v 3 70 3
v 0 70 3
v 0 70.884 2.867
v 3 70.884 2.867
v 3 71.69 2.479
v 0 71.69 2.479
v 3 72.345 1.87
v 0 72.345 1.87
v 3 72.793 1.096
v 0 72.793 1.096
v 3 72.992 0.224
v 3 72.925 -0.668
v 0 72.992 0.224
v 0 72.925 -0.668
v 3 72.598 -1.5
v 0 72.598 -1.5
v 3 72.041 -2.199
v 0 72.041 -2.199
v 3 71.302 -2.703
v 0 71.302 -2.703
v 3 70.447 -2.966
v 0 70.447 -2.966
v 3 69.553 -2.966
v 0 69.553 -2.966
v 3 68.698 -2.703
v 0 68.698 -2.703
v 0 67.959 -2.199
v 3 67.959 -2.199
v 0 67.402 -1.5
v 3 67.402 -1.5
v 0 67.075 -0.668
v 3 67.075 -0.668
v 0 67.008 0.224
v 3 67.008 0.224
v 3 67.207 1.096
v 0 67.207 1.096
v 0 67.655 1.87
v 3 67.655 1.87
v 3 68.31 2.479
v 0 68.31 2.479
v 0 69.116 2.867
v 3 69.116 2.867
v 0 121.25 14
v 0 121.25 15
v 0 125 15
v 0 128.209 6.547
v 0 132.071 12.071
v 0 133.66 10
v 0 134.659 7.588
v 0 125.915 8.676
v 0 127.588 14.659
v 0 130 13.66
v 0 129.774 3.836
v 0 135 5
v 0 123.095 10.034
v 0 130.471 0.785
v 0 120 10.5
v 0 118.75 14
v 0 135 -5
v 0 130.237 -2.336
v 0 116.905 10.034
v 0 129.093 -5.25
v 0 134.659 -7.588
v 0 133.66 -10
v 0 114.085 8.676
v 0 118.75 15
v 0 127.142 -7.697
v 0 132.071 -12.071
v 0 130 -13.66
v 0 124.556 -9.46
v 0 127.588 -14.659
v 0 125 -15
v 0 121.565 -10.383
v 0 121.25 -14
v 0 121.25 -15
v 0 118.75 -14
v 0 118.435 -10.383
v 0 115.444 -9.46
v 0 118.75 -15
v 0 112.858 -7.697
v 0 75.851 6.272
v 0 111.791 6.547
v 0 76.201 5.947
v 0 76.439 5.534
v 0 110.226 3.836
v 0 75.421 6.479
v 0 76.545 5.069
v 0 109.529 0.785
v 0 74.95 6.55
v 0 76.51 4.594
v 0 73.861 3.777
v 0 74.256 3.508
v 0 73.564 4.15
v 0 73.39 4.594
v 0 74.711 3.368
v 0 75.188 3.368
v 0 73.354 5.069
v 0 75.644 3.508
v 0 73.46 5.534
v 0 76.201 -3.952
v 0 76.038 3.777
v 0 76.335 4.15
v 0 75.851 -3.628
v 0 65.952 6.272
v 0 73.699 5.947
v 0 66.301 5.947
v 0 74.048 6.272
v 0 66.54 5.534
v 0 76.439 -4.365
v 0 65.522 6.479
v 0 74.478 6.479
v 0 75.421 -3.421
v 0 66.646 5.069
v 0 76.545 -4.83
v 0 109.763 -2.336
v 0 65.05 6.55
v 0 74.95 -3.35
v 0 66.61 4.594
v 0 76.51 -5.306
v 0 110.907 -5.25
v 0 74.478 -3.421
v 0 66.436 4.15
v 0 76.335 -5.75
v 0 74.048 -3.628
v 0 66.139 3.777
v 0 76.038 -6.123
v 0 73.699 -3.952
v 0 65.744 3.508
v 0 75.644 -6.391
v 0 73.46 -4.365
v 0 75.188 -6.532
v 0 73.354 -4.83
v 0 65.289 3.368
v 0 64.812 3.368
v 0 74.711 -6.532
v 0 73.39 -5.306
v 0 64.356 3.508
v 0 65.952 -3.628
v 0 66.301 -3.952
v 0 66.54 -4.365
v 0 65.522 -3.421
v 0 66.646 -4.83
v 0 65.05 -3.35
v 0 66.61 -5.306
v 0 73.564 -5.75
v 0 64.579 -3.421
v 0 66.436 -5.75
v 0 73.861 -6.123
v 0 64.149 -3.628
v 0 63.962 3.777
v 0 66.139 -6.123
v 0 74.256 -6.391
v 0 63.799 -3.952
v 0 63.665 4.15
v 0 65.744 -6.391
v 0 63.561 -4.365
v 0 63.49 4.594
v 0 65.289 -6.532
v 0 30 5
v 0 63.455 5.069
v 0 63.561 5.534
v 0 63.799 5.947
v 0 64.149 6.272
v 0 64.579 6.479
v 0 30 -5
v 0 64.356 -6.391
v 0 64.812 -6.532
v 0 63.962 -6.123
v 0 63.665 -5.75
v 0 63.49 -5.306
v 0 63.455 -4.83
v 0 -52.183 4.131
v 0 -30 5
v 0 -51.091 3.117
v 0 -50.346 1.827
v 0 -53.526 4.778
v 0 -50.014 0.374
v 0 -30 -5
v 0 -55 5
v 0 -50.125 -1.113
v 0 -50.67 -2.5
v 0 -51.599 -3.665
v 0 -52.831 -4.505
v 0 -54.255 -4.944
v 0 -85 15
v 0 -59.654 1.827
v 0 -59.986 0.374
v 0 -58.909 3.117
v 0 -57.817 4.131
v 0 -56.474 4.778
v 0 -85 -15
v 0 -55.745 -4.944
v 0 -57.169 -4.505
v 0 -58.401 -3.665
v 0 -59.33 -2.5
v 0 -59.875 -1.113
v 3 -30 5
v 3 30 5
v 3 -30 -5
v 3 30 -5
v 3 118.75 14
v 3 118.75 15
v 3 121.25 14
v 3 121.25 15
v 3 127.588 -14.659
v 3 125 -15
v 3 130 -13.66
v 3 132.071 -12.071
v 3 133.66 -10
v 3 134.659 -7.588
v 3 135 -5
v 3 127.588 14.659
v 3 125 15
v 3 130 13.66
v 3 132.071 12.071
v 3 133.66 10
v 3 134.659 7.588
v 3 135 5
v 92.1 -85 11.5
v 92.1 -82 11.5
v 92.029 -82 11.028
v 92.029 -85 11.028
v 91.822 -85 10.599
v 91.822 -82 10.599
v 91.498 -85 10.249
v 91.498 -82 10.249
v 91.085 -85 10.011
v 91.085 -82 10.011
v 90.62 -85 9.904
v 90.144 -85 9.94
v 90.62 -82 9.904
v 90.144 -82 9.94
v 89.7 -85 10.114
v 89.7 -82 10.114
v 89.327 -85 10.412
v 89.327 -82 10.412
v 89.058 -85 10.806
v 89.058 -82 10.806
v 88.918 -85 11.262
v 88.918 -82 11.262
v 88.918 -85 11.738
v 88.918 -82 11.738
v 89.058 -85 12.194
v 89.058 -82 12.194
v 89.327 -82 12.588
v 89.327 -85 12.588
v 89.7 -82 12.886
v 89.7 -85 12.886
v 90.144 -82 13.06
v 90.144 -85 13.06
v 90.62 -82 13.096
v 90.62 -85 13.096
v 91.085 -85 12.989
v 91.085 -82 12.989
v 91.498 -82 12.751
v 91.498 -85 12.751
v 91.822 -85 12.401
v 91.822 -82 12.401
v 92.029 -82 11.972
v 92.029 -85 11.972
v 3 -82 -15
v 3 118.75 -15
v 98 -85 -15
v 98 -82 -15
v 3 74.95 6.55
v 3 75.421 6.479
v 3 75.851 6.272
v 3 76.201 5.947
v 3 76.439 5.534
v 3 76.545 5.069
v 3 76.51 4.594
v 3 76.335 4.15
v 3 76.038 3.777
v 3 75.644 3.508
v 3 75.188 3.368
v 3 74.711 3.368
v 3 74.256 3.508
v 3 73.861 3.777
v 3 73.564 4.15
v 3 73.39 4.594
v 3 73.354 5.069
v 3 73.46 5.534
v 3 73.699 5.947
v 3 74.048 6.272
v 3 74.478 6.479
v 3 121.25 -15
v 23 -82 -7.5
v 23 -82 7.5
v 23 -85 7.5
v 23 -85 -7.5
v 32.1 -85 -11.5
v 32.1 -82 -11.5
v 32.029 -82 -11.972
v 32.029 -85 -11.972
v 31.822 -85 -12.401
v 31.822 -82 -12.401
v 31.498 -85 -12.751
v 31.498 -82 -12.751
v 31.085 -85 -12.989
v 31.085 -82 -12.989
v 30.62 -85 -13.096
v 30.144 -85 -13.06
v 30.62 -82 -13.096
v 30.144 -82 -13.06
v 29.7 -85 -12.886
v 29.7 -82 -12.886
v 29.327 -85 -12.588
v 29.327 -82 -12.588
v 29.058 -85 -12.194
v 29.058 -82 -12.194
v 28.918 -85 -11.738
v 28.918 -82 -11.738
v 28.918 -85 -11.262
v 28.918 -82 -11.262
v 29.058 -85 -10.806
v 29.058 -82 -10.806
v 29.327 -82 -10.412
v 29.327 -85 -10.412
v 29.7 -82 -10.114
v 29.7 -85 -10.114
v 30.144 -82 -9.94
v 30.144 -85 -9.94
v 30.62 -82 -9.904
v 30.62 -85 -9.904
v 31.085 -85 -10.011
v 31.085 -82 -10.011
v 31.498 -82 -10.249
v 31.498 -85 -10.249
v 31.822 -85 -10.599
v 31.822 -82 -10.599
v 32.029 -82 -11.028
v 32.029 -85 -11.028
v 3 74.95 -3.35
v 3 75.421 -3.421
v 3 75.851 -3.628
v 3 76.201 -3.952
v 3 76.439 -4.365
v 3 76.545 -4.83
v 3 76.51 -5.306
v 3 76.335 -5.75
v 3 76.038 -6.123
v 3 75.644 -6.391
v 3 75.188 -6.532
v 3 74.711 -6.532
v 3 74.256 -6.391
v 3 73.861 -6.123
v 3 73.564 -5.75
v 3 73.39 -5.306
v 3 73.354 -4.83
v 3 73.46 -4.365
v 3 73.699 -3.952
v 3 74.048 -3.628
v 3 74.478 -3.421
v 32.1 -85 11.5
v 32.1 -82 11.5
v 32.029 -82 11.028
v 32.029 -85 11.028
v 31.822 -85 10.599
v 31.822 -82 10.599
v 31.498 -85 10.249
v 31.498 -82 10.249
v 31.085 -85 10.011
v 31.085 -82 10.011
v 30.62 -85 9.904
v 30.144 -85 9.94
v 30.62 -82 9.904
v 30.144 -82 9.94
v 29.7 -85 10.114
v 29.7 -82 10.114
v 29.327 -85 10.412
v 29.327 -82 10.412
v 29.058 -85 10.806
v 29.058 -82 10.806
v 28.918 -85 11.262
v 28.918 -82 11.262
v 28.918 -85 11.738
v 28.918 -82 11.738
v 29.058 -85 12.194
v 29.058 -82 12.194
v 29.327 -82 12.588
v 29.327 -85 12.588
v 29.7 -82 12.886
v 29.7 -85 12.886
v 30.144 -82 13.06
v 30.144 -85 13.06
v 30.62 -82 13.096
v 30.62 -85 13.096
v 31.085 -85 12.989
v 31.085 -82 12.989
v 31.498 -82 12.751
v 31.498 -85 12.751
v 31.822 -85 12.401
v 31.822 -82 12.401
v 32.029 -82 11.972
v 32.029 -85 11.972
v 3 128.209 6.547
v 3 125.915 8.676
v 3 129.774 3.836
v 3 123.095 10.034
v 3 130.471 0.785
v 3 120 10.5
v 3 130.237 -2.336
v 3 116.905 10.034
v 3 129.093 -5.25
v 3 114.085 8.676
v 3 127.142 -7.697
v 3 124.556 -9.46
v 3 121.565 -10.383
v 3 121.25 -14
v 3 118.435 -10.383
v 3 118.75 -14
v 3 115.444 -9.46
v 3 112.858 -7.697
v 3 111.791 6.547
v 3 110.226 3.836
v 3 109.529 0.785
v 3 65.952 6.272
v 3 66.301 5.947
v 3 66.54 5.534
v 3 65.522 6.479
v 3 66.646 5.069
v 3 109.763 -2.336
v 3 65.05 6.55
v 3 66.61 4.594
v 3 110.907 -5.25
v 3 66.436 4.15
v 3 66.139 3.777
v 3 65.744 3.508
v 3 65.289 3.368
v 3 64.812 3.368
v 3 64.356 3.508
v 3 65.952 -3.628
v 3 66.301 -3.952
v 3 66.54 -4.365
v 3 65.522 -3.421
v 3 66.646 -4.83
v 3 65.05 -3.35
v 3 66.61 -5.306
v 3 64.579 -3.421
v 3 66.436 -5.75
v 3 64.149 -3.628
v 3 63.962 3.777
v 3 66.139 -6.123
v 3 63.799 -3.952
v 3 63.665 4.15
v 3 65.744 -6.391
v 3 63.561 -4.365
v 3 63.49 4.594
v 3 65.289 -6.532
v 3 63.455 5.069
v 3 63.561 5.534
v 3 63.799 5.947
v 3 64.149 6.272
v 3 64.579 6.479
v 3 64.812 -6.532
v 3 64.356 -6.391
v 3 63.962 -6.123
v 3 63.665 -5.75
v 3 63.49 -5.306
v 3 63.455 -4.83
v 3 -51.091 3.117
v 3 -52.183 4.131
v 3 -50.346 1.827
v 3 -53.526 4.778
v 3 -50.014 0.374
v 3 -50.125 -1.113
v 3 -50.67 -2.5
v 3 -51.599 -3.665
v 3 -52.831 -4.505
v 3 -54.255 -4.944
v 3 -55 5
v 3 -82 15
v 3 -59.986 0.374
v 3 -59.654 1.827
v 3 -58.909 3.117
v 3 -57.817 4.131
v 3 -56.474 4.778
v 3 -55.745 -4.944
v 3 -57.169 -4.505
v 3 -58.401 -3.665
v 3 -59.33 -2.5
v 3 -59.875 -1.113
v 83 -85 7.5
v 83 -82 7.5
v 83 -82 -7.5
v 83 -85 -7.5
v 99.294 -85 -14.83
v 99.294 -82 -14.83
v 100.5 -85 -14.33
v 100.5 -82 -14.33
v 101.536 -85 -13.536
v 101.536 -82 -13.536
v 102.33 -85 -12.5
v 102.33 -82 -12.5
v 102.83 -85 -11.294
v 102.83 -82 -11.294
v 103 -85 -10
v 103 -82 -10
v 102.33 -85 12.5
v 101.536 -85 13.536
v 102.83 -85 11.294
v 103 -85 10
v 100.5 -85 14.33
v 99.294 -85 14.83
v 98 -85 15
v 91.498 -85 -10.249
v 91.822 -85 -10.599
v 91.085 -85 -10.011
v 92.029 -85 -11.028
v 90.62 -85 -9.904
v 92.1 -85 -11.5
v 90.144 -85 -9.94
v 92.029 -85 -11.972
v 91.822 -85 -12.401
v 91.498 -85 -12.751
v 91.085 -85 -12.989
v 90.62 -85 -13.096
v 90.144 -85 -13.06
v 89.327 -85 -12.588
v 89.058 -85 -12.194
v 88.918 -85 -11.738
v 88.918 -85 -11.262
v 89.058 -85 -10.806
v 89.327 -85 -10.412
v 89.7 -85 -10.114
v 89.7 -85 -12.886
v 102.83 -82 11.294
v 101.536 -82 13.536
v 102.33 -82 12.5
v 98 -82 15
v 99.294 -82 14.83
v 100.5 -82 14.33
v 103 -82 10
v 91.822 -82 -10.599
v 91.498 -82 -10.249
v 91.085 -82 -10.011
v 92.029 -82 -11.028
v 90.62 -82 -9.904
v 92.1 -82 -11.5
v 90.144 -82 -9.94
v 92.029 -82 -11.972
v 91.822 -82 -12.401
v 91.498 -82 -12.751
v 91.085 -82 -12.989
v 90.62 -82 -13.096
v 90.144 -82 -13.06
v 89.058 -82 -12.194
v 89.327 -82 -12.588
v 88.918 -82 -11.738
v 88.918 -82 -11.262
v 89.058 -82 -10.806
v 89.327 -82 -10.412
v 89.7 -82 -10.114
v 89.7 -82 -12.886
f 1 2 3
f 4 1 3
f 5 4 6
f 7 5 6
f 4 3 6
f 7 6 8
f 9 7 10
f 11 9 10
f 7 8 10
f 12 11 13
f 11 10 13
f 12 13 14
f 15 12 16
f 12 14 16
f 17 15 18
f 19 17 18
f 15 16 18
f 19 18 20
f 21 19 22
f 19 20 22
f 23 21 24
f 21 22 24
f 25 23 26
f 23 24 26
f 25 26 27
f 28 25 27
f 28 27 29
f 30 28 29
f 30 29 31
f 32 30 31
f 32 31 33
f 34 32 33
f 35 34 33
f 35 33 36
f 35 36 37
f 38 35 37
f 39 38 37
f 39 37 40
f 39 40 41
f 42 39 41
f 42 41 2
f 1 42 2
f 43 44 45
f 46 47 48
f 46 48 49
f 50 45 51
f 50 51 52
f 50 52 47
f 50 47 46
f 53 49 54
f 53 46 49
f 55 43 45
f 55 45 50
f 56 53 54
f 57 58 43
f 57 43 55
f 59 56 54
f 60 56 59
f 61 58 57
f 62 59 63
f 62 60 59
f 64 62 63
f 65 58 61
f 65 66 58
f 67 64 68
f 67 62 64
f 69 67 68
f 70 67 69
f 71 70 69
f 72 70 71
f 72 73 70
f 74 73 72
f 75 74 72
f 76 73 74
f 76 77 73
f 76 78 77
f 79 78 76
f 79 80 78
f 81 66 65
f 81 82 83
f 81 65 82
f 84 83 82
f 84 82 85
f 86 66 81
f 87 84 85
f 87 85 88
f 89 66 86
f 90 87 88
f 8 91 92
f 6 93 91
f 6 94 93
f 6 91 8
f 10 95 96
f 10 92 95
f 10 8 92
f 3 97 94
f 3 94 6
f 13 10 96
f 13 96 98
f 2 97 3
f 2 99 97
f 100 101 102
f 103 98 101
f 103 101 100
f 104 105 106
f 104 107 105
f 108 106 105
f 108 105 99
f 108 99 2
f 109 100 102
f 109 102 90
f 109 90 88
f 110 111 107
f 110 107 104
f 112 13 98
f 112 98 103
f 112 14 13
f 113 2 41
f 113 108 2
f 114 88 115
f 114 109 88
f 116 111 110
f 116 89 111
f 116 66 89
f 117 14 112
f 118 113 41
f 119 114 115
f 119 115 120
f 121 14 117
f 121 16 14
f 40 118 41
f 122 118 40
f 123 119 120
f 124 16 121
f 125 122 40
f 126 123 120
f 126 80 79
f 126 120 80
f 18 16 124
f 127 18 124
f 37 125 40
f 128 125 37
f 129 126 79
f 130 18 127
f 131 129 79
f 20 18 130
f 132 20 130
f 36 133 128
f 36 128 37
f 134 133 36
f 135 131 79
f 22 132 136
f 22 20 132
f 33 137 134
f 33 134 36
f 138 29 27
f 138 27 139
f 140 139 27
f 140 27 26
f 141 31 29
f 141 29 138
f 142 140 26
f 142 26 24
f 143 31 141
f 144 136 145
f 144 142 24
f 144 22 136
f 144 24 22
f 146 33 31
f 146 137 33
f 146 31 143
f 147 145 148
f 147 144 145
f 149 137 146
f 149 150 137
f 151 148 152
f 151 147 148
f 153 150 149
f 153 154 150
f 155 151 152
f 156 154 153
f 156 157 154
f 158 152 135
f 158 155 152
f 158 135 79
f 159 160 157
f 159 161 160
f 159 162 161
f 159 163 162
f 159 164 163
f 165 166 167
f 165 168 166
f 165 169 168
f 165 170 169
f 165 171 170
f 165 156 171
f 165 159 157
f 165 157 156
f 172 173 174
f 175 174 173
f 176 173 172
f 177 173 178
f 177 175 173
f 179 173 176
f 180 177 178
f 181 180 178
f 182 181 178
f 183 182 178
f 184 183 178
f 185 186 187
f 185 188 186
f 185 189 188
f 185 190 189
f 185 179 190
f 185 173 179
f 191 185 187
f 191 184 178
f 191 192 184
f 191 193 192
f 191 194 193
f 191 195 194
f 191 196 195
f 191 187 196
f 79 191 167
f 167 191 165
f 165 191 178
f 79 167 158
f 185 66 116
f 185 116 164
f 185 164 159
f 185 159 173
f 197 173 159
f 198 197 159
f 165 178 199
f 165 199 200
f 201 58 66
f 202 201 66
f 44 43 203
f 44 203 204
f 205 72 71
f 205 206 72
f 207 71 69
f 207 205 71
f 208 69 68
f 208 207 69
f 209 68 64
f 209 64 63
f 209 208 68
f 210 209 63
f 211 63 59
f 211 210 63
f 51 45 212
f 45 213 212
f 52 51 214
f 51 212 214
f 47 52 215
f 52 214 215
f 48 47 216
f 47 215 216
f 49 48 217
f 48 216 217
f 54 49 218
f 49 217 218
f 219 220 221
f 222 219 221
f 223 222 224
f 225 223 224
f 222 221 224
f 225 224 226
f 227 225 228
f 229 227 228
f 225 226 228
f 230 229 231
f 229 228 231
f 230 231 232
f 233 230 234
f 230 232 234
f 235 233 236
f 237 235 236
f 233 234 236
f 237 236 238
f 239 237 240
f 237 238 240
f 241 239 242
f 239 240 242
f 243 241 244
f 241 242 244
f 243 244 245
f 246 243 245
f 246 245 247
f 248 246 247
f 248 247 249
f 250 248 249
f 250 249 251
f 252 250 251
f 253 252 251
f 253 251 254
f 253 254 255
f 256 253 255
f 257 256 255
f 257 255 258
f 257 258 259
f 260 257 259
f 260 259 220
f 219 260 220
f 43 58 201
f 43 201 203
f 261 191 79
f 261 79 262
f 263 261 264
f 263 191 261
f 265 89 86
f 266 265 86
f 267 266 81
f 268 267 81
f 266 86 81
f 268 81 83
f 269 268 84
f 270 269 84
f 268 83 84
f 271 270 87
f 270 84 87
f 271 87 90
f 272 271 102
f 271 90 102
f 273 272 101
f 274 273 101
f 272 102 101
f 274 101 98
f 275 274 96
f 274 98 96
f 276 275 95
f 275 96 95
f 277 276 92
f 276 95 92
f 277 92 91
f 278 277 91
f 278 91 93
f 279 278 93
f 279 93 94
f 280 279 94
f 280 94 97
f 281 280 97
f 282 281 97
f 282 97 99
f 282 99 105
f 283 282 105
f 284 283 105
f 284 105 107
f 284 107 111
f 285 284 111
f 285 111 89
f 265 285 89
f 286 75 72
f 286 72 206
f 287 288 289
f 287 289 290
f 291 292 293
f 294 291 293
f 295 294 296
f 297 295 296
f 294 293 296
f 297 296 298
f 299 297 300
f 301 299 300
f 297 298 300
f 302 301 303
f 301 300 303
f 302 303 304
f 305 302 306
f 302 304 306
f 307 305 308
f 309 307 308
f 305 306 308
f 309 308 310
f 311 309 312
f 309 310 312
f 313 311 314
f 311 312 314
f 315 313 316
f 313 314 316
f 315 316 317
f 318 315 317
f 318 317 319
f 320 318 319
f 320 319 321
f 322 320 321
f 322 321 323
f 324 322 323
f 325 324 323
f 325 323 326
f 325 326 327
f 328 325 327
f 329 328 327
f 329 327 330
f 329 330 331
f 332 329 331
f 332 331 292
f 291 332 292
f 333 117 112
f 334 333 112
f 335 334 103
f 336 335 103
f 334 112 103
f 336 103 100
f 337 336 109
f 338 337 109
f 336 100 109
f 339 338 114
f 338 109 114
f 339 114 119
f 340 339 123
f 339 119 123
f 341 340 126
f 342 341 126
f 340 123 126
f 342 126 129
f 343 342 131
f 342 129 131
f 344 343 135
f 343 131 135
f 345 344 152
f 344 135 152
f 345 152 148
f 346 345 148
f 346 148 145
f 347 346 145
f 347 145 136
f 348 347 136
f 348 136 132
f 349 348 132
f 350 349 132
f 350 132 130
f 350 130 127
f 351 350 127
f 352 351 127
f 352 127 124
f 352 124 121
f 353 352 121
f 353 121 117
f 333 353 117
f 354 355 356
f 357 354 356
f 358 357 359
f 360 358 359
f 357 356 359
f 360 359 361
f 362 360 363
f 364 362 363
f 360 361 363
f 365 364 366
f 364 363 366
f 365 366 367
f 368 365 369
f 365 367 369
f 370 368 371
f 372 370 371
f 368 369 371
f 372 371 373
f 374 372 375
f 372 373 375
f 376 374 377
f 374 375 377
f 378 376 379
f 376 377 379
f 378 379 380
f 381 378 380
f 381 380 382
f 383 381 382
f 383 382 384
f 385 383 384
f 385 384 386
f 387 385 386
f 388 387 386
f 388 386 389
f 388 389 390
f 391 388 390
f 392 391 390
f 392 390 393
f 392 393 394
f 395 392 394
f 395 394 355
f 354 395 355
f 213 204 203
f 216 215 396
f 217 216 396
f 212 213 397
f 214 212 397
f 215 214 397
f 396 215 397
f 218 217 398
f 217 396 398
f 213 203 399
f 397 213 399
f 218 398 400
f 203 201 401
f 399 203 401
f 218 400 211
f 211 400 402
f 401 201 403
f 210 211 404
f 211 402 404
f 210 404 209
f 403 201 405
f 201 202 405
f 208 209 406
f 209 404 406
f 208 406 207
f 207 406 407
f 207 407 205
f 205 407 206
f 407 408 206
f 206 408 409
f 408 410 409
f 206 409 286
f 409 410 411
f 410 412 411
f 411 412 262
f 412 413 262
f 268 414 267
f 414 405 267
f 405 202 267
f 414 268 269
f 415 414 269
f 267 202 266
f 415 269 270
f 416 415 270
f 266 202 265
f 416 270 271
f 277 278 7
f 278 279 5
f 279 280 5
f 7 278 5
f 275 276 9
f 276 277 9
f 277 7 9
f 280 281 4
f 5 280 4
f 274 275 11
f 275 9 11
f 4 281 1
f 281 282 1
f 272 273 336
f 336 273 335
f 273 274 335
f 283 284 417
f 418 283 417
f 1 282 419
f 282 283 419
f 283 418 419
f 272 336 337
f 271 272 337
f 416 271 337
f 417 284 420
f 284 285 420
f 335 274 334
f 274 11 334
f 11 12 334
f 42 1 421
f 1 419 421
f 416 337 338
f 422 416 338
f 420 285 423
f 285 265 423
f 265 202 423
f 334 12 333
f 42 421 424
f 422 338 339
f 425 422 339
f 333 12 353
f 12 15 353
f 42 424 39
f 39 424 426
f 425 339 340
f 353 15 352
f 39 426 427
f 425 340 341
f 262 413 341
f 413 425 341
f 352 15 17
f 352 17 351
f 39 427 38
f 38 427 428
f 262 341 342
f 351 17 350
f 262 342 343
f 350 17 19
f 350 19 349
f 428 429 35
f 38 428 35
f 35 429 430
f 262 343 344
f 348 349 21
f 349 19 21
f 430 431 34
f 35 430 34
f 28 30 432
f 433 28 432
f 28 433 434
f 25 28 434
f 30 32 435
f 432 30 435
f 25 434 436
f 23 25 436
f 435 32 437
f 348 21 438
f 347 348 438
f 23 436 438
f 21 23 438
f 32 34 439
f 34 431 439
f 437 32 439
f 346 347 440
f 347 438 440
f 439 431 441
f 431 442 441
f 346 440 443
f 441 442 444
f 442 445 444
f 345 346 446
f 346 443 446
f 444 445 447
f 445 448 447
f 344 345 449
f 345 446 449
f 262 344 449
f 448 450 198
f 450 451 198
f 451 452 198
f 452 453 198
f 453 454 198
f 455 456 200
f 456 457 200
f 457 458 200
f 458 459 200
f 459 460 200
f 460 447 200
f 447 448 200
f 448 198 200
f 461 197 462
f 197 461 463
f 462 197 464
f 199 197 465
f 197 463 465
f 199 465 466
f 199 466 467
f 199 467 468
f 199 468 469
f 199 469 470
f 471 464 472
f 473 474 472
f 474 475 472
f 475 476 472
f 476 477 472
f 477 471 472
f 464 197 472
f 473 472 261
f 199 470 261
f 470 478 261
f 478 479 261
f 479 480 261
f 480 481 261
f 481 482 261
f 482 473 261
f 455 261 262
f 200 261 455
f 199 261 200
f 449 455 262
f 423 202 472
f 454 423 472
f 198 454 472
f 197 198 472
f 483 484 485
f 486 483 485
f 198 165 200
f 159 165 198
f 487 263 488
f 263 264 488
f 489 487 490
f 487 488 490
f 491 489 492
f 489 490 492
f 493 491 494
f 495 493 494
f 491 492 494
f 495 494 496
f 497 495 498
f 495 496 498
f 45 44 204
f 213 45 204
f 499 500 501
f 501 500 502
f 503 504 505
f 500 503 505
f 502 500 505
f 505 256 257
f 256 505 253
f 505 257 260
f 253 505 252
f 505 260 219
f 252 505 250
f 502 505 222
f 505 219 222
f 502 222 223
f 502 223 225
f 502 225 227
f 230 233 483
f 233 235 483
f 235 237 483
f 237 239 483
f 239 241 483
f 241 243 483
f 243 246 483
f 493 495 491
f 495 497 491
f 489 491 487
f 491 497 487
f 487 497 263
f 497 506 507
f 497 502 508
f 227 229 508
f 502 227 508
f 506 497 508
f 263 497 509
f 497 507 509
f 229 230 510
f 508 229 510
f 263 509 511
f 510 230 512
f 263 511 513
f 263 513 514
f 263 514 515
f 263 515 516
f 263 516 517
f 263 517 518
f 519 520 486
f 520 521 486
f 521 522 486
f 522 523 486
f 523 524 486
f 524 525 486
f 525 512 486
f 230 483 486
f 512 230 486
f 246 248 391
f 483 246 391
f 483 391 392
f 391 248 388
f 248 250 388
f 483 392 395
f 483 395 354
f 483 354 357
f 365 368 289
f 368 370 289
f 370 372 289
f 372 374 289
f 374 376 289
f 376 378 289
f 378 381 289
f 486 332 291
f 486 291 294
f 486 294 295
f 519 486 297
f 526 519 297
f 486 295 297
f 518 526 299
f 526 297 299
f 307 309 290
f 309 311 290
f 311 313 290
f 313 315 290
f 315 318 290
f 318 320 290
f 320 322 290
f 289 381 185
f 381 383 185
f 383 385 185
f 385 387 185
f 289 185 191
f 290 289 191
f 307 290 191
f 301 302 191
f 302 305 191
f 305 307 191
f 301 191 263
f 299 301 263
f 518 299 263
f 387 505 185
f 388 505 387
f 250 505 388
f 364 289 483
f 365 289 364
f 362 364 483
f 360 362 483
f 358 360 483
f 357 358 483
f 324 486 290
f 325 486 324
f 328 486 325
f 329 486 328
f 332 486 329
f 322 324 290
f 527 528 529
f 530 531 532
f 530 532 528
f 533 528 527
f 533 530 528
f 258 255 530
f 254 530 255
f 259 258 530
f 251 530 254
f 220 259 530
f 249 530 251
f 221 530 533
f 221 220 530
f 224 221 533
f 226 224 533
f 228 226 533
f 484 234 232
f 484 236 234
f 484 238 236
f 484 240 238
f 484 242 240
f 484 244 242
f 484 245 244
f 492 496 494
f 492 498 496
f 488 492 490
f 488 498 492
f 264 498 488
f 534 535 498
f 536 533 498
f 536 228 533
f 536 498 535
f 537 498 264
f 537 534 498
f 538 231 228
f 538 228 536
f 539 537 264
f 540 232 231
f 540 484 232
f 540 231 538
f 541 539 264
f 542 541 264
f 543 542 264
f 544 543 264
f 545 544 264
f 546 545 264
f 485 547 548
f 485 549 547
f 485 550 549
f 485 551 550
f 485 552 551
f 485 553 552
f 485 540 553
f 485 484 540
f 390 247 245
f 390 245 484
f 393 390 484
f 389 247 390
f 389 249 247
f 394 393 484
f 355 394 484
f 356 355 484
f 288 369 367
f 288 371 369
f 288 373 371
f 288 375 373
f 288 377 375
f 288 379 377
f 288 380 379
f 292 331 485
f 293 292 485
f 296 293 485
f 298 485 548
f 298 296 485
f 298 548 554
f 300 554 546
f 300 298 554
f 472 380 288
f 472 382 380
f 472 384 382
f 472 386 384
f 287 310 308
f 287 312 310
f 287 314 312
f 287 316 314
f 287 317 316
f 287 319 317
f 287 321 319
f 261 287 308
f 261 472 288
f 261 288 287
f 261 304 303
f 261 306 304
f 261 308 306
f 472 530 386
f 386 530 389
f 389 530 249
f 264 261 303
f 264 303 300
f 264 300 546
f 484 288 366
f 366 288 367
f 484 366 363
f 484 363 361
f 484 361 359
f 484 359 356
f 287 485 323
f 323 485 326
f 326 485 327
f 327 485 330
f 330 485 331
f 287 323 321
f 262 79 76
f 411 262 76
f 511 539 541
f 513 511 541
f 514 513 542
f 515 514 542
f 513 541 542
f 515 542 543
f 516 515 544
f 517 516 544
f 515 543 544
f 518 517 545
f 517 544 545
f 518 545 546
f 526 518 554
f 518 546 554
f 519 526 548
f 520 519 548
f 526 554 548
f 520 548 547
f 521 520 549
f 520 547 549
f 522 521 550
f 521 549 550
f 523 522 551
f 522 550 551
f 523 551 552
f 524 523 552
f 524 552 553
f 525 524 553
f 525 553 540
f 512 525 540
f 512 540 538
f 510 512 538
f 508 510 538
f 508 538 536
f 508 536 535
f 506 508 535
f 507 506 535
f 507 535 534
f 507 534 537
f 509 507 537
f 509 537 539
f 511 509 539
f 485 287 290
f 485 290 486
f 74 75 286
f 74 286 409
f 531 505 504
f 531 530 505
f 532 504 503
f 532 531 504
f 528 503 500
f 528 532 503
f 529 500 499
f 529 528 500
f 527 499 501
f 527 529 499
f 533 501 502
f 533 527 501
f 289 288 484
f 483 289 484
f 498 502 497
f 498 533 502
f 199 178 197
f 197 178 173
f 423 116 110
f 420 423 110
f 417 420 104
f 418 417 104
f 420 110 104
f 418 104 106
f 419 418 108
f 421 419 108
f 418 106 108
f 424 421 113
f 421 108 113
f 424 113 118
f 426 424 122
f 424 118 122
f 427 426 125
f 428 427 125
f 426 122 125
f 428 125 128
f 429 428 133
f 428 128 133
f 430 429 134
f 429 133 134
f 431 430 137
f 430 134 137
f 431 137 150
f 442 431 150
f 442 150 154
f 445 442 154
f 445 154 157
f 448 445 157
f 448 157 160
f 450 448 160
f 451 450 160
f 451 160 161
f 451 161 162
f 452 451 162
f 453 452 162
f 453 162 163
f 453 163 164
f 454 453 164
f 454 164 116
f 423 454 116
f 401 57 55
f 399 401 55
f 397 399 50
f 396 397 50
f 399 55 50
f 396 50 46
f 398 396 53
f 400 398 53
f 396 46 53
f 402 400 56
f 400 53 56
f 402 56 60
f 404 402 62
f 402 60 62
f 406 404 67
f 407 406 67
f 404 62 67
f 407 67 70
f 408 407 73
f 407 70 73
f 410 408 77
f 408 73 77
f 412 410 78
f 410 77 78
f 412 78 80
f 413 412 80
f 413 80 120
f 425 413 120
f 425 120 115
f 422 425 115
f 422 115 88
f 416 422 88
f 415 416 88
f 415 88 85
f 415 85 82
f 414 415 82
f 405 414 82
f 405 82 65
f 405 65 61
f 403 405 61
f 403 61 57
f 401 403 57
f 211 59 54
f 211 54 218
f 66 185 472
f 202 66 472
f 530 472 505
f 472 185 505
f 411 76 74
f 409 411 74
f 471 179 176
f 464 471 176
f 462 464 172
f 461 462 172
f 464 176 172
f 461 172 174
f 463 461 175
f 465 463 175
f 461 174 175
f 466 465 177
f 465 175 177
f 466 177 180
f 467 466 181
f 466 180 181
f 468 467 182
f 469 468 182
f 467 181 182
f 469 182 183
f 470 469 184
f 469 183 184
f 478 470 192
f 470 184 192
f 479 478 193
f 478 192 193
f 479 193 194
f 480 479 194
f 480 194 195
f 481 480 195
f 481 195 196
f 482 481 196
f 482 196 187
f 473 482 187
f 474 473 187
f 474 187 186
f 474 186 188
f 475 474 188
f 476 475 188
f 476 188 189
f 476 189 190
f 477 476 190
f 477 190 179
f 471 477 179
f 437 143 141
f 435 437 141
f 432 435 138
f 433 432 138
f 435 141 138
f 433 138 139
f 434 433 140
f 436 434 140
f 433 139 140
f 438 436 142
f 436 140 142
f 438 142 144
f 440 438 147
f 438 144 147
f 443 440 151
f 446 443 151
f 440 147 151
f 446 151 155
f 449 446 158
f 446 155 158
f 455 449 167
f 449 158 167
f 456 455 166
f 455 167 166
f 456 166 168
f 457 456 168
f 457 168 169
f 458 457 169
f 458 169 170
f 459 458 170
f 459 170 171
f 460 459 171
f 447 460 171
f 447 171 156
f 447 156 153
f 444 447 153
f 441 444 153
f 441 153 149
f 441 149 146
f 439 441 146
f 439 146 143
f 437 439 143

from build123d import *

# Parameters (mm, degrees)
SKETCH_1_W          = 30
SKETCH_1_H          = 170
EXTRUDE_1_DEPTH     = 3
SKETCH_2_W          = 30
SKETCH_2_H          = 3
EXTRUDE_2_DEPTH     = 100
SKETCH_4_R          = 1.6
SKETCH_4_R_2        = 3
CUT_EXTRUDE_1_DEPTH = 104
SKETCH_5_W          = 3
SKETCH_5_H          = 30
EXTRUDE_3_DEPTH     = 50
SKETCH_6_R          = 10.5
SKETCH_6_W          = 2
SKETCH_6_H          = 2.5
CUT_EXTRUDE_2_DEPTH = 104
FILLET_1_R          = 10
SKETCH_7_R          = 1.6
SKETCH_7_W          = 60
SKETCH_7_H          = 15
CUT_EXTRUDE_3_DEPTH = 4
FILLET_2_R          = 5
SKETCH_8_R          = 5
SKETCH_8_W          = 10
SKETCH_8_H          = 60
CUT_EXTRUDE_4_DEPTH = 104


with BuildPart() as part:
    # 草图1 → 凸台-拉伸1 (new body)
    with BuildSketch(Plane(origin=(0, 0, 0), x_dir=(0, 0, -1), z_dir=(1, 0, 0))):
        Rectangle(SKETCH_1_W, SKETCH_1_H)
    extrude(amount=EXTRUDE_1_DEPTH)

    # 草图2 → 凸台-拉伸2 (add)
    with BuildSketch(Plane(origin=(3, 0, 0), x_dir=(0, 0, -1), z_dir=(1, 0, 0))):
        with Locations((0, -83.5)):
            Rectangle(SKETCH_2_W, SKETCH_2_H)
    extrude(amount=EXTRUDE_2_DEPTH)

    # 草图4 → 切除-拉伸1 (cut, through all)
    with BuildSketch(Plane.ZY):
        with Locations((-4.949747468, 74.949747468)):
            Circle(SKETCH_4_R)
        with Locations((4.949747468, 74.949747468)):
            Circle(SKETCH_4_R)
        with Locations((4.949747468, 65.050252532)):
            Circle(SKETCH_4_R)
        with Locations((-4.949747468, 65.050252532)):
            Circle(SKETCH_4_R)
        with Locations((0, 70)):
            Circle(SKETCH_4_R_2)
    extrude(amount=-CUT_EXTRUDE_1_DEPTH, mode=Mode.SUBTRACT)

    # 草图5 → 凸台-拉伸3 (add)
    with BuildSketch(Plane(origin=(0, 85, 0), x_dir=(1, 0, 0), z_dir=(0, 1, 0))):
        with Locations((1.5, 0)):
            Rectangle(SKETCH_5_W, SKETCH_5_H)
    extrude(amount=EXTRUDE_3_DEPTH)

    # 草图6 → 切除-拉伸2 (cut, through all)
    with BuildSketch(Plane.ZY):
        with Locations((0, 120)):
            Circle(SKETCH_6_R)
        with Locations((-15, 120)):
            Rectangle(SKETCH_6_W, SKETCH_6_H)
        with Locations((15, 120)):
            Rectangle(SKETCH_6_W, SKETCH_6_H)
    extrude(amount=-CUT_EXTRUDE_2_DEPTH, mode=Mode.SUBTRACT)

    # 圆角1
    fillet_1_edges = [part.edges().sort_by_distance(p)[0] for p in [
        (1.5, 135, 15),
        (1.5, 135, -15),
    ]]
    fillet(fillet_1_edges, radius=FILLET_1_R)

    # 草图7 → 切除-拉伸3 (cut, through all)
    with BuildSketch(Plane(origin=(0, -82, 0), x_dir=(1, 0, 0), z_dir=(0, 1, 0))):
        with Locations((90.5, 11.5)):
            Circle(SKETCH_7_R)
        with Locations((30.5, 11.5)):
            Circle(SKETCH_7_R)
        with Locations((90.5, -11.5)):
            Circle(SKETCH_7_R)
        with Locations((30.5, -11.5)):
            Circle(SKETCH_7_R)
        with Locations((53, 0)):
            Rectangle(SKETCH_7_W, SKETCH_7_H)
    extrude(amount=-CUT_EXTRUDE_3_DEPTH, mode=Mode.SUBTRACT)

    # 圆角2
    fillet_2_edges = [part.edges().sort_by_distance(p)[0] for p in [
        (103, -83.5, 15),
        (103, -83.5, -15),
    ]]
    fillet(fillet_2_edges, radius=FILLET_2_R)

    # 草图8 → 切除-拉伸4 (cut, through all)
    with BuildSketch(Plane.ZY):
        with Locations((0, -55)):
            Circle(SKETCH_8_R)
        Rectangle(SKETCH_8_W, SKETCH_8_H)
    extrude(amount=-CUT_EXTRUDE_4_DEPTH, mode=Mode.SUBTRACT)


solid = part.part
